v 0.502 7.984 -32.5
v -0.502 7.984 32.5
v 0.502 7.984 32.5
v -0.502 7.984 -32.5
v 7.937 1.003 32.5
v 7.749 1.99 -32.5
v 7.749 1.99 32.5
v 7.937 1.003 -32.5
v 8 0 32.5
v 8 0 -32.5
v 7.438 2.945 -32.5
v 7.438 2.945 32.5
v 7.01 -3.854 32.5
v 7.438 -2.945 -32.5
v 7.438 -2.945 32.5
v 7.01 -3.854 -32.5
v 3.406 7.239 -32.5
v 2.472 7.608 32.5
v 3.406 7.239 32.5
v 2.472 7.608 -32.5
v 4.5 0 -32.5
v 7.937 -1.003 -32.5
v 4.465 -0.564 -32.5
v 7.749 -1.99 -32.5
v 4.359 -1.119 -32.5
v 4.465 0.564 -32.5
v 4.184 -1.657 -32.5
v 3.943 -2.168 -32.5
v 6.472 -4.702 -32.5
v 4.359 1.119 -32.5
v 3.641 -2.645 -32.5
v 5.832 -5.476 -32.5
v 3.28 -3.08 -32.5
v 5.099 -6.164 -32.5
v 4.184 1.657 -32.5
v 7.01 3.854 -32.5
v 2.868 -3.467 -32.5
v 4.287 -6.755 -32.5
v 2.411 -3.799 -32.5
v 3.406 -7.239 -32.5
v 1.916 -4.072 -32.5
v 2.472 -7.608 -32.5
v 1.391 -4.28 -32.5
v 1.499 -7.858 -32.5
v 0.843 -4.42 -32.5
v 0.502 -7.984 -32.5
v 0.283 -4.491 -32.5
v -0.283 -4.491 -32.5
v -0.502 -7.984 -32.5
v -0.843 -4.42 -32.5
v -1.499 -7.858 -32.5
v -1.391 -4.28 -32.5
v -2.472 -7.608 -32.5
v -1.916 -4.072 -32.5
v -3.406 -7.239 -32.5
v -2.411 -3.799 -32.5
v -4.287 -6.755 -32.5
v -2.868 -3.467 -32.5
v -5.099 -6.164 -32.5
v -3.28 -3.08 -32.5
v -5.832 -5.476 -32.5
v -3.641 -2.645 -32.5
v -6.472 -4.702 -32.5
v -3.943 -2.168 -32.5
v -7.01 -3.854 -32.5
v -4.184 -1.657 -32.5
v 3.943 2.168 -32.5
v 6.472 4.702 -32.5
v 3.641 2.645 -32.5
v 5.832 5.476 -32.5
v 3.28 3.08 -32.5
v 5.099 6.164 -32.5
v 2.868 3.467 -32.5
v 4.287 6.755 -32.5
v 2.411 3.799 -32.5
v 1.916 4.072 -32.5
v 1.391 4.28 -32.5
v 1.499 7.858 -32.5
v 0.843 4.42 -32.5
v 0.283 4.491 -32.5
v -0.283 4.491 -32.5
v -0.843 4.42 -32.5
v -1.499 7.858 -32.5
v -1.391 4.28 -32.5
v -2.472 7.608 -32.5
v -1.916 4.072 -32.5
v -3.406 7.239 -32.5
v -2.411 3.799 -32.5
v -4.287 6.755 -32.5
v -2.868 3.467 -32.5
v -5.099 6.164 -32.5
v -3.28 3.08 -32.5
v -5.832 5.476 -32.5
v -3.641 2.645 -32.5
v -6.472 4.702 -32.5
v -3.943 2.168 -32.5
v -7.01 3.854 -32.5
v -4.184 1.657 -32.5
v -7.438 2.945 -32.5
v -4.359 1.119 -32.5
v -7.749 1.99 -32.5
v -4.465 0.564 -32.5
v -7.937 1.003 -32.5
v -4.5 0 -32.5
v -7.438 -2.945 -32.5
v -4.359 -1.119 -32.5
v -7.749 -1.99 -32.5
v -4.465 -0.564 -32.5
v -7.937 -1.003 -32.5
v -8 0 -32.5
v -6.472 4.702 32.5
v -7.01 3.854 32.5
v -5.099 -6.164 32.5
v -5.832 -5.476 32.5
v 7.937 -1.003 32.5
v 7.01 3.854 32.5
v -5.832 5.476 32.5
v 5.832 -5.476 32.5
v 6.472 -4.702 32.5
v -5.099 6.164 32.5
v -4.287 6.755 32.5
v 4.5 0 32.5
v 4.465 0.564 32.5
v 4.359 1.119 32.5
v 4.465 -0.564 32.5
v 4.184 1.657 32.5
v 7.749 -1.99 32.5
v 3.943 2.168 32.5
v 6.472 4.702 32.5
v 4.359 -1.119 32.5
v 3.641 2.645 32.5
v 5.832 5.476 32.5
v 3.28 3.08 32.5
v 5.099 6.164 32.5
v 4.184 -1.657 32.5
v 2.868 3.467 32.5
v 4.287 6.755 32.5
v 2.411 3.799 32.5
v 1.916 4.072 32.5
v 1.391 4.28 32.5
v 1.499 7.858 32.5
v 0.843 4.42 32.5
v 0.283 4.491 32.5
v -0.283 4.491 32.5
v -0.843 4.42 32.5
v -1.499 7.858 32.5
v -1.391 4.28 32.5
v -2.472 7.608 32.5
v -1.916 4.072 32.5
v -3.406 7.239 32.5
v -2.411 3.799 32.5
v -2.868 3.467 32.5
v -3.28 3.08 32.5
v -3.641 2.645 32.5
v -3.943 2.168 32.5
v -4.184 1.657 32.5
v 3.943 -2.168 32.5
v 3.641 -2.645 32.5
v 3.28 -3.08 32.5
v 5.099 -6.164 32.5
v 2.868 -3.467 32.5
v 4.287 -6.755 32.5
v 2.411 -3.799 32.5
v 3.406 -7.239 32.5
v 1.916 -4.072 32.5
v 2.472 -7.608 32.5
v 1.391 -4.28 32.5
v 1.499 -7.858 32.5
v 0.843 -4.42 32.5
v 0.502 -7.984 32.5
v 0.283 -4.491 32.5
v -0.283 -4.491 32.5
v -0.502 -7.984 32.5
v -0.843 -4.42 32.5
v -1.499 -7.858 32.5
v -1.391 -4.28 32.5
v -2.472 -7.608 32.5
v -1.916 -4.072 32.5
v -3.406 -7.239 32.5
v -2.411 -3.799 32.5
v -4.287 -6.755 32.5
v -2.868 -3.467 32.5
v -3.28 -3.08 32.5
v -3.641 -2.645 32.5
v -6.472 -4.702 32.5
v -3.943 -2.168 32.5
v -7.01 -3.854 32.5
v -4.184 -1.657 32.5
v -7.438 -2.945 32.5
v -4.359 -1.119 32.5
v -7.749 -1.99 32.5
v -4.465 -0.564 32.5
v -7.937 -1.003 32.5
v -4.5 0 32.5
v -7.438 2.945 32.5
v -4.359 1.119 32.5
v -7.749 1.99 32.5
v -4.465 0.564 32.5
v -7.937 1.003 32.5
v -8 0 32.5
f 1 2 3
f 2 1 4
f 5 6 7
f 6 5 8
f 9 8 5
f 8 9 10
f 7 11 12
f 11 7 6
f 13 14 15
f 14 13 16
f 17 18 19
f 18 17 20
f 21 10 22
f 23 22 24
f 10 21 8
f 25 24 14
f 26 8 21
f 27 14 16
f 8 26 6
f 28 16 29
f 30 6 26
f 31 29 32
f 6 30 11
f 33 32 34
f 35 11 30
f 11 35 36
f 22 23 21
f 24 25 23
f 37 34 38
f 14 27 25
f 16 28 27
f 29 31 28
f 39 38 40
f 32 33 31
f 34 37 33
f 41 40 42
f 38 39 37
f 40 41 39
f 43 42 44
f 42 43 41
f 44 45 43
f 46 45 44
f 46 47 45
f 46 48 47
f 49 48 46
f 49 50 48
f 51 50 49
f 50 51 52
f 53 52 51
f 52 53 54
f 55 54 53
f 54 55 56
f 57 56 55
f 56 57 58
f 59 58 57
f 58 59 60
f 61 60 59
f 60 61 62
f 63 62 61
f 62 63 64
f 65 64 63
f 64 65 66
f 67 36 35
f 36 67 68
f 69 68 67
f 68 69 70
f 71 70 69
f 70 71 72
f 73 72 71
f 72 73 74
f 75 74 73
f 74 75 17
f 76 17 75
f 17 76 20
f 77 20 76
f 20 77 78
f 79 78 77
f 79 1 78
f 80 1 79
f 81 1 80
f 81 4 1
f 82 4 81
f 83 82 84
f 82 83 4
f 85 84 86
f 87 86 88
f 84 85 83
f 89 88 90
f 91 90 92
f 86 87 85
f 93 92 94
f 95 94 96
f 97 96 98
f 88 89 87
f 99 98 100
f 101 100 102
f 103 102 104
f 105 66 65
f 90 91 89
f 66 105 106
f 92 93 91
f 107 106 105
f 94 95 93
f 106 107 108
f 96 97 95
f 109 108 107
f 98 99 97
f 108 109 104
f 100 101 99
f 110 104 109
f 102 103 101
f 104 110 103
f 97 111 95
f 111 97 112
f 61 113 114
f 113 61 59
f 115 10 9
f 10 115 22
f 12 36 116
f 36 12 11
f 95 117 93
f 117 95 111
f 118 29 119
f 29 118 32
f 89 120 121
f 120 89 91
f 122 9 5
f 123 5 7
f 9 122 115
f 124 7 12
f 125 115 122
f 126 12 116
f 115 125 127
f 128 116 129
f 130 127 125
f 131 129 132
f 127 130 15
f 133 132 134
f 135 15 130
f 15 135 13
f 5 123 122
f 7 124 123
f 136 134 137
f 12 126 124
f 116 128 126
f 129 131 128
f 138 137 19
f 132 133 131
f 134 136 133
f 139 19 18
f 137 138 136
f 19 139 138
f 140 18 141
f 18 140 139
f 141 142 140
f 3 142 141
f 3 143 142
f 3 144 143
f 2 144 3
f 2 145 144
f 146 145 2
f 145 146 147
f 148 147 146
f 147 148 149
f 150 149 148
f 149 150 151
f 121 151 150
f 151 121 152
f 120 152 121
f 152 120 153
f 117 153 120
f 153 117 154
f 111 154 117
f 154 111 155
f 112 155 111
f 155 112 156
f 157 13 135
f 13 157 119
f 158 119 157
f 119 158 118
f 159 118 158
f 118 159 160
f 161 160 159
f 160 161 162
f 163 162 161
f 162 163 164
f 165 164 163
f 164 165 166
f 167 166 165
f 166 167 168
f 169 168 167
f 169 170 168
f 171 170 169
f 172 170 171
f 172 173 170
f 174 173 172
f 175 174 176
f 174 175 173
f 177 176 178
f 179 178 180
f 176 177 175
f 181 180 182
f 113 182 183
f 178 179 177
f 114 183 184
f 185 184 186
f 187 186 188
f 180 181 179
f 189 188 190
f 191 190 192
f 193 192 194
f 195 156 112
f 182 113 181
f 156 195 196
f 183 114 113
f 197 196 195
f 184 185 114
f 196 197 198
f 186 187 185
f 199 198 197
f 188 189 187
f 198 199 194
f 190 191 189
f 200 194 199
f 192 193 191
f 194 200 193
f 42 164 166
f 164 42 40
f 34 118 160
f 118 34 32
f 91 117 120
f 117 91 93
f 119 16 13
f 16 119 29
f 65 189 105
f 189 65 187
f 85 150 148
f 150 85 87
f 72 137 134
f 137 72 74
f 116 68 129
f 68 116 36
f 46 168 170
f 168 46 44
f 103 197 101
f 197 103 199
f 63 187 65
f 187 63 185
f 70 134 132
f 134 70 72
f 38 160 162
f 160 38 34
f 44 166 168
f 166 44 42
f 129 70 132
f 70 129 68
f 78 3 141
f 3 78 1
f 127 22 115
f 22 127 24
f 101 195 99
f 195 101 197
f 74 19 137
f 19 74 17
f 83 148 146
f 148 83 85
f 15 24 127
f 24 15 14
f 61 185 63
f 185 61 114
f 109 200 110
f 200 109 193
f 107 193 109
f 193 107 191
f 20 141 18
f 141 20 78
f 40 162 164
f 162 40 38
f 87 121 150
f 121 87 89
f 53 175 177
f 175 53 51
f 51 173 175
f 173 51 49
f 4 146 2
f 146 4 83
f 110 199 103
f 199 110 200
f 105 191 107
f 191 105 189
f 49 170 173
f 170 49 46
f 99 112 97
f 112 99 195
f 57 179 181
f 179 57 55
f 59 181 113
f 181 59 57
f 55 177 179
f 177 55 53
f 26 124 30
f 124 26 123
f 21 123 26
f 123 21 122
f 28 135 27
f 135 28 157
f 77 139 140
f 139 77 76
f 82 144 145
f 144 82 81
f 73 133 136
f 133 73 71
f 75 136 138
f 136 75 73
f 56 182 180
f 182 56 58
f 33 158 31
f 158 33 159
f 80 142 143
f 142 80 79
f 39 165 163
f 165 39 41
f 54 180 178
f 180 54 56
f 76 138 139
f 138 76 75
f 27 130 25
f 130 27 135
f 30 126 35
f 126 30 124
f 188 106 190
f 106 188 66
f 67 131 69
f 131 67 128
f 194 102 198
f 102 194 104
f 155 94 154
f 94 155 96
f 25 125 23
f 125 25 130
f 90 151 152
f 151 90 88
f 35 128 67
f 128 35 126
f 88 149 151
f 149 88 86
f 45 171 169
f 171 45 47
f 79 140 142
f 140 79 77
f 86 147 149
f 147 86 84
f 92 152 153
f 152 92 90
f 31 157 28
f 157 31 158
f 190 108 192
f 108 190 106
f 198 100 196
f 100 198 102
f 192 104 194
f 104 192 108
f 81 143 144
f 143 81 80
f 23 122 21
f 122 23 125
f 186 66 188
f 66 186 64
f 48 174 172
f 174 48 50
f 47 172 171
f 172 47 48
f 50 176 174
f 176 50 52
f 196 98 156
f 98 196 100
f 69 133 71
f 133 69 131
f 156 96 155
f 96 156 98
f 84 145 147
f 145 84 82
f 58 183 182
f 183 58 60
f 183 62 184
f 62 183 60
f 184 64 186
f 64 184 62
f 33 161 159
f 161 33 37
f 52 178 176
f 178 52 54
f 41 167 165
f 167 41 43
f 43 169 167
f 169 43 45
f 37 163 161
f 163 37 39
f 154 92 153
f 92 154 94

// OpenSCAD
$fn = 50;


difference() {
	union() {
		translate(v = [0, 0, -32.5000000000]) {
			cylinder(h = 65, r = 8.0000000000);
		}
	}
	union() {
		translate(v = [0, 0, -100.0000000000]) {
			cylinder(h = 200, r = 4.5000000000);
		}
	}
}
